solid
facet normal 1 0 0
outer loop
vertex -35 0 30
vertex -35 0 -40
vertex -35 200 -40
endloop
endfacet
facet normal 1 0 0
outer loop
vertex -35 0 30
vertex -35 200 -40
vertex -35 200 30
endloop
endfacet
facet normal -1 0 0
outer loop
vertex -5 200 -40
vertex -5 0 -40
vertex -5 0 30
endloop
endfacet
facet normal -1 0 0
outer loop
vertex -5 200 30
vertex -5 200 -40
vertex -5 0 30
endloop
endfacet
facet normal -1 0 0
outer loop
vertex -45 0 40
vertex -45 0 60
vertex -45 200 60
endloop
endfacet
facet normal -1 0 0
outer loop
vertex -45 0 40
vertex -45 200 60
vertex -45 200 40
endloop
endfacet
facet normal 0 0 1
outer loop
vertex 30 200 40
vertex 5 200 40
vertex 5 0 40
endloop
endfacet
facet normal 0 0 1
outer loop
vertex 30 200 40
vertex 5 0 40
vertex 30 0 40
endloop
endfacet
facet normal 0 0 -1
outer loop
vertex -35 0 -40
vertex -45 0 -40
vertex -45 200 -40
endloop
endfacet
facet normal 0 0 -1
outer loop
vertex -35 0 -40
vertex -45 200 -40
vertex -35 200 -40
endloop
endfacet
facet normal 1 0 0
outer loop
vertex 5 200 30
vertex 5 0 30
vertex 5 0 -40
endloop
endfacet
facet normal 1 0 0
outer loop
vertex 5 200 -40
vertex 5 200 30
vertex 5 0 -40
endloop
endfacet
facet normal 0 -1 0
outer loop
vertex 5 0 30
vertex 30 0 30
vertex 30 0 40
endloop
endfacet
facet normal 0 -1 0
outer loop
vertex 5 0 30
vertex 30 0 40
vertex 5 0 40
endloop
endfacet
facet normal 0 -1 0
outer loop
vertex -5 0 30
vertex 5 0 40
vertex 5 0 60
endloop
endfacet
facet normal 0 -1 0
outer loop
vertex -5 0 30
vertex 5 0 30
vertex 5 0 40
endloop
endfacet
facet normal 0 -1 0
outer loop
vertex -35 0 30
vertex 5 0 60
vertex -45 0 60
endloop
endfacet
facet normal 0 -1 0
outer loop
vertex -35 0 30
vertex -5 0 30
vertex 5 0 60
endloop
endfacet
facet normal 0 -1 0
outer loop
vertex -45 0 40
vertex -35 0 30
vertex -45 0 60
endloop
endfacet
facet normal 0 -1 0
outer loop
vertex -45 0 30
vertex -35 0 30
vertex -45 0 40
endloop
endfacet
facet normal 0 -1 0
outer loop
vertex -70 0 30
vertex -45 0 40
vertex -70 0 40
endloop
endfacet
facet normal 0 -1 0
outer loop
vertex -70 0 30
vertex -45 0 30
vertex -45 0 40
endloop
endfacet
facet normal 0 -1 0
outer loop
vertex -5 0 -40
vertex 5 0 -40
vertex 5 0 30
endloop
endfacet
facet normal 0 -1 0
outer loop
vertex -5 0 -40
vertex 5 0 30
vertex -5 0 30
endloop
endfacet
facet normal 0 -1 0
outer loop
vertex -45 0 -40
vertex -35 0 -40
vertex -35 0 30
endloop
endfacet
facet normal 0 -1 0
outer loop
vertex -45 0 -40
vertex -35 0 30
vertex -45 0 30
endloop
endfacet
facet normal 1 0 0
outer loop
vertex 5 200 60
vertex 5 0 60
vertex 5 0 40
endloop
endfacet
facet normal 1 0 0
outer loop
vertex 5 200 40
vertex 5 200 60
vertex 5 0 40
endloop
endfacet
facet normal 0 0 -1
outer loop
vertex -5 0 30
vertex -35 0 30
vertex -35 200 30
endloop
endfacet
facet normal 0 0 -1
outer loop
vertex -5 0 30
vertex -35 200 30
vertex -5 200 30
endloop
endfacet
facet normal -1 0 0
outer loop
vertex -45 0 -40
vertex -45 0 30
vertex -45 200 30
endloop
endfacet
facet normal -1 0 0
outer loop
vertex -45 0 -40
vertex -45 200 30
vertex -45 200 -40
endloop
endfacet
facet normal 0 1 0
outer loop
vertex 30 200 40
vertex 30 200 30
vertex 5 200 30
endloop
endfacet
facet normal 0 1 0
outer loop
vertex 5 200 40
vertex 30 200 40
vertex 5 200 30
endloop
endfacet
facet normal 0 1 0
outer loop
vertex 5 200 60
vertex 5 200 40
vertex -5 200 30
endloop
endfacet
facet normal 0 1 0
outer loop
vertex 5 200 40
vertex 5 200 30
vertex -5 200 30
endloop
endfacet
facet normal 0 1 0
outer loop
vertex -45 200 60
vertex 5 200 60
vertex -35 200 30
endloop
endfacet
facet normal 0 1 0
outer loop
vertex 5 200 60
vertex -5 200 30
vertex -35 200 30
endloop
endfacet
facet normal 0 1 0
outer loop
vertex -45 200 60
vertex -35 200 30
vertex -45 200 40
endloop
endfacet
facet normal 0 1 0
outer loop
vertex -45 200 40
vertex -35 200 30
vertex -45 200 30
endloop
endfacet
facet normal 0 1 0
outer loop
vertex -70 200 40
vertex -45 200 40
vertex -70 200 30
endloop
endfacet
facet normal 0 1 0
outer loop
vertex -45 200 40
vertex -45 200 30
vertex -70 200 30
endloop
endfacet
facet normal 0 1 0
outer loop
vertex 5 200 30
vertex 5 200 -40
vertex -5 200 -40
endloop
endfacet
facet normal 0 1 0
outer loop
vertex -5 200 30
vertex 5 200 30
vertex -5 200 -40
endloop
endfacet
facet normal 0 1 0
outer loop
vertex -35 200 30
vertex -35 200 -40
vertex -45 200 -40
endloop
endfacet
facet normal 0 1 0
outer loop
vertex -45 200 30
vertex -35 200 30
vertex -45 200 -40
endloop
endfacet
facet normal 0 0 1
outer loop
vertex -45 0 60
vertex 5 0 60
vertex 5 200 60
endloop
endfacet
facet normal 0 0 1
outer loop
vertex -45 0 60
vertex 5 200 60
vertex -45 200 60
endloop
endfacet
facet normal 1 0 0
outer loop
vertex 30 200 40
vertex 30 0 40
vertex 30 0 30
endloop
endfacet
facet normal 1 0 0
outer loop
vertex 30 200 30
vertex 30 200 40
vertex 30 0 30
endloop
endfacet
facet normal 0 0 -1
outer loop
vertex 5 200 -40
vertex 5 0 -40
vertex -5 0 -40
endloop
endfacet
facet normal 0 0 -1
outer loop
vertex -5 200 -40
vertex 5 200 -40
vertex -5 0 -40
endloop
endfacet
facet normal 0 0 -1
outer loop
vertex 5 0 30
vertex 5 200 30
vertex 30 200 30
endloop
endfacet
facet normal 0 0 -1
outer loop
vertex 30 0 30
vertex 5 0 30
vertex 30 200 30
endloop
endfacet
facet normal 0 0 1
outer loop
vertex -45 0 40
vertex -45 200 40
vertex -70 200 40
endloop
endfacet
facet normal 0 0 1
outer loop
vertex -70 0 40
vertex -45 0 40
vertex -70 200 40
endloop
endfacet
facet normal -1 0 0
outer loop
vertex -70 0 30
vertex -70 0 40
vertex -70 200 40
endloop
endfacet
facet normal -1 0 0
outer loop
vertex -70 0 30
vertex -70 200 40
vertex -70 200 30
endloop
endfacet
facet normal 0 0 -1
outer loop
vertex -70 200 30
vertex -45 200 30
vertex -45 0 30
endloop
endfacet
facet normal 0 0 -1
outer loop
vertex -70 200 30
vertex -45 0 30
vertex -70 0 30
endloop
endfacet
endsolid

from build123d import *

# Parameters (mm, degrees)
SKETCH_1_W      = 10
SKETCH_1_H      = 10
SKETCH_1_W_2    = 25
EXTRUDE_1_DEPTH = 200


with BuildPart() as part:
    # Эскиз1 → Бобышка-Вытянуть1 (new body)
    with BuildSketch(Plane(origin=(0, 0, 0), x_dir=(1, 0, 0), z_dir=(0, 1, 0))):
        Polygon((-5, 40), (-5, 2), (0, 40), align=None)
        Polygon((0, 40), (-5, 2), (-5, -30), (5, -30), (5, 40), align=None)
        with Locations((0, -35)):
            Rectangle(SKETCH_1_W, SKETCH_1_H)
        Polygon((-5, -40), (-5, -30), (-20, -30), (-20, -60), (5, -60), (5, -40), align=None)
        with Locations((17.5, -35)):
            Rectangle(SKETCH_1_W_2, SKETCH_1_H)
    extrude_1 = extrude(amount=EXTRUDE_1_DEPTH)

    # Зеркальное отражение1: Бобышка-Вытянуть1 across plane
    add(extrude_1.mirror(Plane(origin=(-20, 200, 30), x_dir=(0, 0, 1), z_dir=(1, 0, 0))))


solid = part.part
